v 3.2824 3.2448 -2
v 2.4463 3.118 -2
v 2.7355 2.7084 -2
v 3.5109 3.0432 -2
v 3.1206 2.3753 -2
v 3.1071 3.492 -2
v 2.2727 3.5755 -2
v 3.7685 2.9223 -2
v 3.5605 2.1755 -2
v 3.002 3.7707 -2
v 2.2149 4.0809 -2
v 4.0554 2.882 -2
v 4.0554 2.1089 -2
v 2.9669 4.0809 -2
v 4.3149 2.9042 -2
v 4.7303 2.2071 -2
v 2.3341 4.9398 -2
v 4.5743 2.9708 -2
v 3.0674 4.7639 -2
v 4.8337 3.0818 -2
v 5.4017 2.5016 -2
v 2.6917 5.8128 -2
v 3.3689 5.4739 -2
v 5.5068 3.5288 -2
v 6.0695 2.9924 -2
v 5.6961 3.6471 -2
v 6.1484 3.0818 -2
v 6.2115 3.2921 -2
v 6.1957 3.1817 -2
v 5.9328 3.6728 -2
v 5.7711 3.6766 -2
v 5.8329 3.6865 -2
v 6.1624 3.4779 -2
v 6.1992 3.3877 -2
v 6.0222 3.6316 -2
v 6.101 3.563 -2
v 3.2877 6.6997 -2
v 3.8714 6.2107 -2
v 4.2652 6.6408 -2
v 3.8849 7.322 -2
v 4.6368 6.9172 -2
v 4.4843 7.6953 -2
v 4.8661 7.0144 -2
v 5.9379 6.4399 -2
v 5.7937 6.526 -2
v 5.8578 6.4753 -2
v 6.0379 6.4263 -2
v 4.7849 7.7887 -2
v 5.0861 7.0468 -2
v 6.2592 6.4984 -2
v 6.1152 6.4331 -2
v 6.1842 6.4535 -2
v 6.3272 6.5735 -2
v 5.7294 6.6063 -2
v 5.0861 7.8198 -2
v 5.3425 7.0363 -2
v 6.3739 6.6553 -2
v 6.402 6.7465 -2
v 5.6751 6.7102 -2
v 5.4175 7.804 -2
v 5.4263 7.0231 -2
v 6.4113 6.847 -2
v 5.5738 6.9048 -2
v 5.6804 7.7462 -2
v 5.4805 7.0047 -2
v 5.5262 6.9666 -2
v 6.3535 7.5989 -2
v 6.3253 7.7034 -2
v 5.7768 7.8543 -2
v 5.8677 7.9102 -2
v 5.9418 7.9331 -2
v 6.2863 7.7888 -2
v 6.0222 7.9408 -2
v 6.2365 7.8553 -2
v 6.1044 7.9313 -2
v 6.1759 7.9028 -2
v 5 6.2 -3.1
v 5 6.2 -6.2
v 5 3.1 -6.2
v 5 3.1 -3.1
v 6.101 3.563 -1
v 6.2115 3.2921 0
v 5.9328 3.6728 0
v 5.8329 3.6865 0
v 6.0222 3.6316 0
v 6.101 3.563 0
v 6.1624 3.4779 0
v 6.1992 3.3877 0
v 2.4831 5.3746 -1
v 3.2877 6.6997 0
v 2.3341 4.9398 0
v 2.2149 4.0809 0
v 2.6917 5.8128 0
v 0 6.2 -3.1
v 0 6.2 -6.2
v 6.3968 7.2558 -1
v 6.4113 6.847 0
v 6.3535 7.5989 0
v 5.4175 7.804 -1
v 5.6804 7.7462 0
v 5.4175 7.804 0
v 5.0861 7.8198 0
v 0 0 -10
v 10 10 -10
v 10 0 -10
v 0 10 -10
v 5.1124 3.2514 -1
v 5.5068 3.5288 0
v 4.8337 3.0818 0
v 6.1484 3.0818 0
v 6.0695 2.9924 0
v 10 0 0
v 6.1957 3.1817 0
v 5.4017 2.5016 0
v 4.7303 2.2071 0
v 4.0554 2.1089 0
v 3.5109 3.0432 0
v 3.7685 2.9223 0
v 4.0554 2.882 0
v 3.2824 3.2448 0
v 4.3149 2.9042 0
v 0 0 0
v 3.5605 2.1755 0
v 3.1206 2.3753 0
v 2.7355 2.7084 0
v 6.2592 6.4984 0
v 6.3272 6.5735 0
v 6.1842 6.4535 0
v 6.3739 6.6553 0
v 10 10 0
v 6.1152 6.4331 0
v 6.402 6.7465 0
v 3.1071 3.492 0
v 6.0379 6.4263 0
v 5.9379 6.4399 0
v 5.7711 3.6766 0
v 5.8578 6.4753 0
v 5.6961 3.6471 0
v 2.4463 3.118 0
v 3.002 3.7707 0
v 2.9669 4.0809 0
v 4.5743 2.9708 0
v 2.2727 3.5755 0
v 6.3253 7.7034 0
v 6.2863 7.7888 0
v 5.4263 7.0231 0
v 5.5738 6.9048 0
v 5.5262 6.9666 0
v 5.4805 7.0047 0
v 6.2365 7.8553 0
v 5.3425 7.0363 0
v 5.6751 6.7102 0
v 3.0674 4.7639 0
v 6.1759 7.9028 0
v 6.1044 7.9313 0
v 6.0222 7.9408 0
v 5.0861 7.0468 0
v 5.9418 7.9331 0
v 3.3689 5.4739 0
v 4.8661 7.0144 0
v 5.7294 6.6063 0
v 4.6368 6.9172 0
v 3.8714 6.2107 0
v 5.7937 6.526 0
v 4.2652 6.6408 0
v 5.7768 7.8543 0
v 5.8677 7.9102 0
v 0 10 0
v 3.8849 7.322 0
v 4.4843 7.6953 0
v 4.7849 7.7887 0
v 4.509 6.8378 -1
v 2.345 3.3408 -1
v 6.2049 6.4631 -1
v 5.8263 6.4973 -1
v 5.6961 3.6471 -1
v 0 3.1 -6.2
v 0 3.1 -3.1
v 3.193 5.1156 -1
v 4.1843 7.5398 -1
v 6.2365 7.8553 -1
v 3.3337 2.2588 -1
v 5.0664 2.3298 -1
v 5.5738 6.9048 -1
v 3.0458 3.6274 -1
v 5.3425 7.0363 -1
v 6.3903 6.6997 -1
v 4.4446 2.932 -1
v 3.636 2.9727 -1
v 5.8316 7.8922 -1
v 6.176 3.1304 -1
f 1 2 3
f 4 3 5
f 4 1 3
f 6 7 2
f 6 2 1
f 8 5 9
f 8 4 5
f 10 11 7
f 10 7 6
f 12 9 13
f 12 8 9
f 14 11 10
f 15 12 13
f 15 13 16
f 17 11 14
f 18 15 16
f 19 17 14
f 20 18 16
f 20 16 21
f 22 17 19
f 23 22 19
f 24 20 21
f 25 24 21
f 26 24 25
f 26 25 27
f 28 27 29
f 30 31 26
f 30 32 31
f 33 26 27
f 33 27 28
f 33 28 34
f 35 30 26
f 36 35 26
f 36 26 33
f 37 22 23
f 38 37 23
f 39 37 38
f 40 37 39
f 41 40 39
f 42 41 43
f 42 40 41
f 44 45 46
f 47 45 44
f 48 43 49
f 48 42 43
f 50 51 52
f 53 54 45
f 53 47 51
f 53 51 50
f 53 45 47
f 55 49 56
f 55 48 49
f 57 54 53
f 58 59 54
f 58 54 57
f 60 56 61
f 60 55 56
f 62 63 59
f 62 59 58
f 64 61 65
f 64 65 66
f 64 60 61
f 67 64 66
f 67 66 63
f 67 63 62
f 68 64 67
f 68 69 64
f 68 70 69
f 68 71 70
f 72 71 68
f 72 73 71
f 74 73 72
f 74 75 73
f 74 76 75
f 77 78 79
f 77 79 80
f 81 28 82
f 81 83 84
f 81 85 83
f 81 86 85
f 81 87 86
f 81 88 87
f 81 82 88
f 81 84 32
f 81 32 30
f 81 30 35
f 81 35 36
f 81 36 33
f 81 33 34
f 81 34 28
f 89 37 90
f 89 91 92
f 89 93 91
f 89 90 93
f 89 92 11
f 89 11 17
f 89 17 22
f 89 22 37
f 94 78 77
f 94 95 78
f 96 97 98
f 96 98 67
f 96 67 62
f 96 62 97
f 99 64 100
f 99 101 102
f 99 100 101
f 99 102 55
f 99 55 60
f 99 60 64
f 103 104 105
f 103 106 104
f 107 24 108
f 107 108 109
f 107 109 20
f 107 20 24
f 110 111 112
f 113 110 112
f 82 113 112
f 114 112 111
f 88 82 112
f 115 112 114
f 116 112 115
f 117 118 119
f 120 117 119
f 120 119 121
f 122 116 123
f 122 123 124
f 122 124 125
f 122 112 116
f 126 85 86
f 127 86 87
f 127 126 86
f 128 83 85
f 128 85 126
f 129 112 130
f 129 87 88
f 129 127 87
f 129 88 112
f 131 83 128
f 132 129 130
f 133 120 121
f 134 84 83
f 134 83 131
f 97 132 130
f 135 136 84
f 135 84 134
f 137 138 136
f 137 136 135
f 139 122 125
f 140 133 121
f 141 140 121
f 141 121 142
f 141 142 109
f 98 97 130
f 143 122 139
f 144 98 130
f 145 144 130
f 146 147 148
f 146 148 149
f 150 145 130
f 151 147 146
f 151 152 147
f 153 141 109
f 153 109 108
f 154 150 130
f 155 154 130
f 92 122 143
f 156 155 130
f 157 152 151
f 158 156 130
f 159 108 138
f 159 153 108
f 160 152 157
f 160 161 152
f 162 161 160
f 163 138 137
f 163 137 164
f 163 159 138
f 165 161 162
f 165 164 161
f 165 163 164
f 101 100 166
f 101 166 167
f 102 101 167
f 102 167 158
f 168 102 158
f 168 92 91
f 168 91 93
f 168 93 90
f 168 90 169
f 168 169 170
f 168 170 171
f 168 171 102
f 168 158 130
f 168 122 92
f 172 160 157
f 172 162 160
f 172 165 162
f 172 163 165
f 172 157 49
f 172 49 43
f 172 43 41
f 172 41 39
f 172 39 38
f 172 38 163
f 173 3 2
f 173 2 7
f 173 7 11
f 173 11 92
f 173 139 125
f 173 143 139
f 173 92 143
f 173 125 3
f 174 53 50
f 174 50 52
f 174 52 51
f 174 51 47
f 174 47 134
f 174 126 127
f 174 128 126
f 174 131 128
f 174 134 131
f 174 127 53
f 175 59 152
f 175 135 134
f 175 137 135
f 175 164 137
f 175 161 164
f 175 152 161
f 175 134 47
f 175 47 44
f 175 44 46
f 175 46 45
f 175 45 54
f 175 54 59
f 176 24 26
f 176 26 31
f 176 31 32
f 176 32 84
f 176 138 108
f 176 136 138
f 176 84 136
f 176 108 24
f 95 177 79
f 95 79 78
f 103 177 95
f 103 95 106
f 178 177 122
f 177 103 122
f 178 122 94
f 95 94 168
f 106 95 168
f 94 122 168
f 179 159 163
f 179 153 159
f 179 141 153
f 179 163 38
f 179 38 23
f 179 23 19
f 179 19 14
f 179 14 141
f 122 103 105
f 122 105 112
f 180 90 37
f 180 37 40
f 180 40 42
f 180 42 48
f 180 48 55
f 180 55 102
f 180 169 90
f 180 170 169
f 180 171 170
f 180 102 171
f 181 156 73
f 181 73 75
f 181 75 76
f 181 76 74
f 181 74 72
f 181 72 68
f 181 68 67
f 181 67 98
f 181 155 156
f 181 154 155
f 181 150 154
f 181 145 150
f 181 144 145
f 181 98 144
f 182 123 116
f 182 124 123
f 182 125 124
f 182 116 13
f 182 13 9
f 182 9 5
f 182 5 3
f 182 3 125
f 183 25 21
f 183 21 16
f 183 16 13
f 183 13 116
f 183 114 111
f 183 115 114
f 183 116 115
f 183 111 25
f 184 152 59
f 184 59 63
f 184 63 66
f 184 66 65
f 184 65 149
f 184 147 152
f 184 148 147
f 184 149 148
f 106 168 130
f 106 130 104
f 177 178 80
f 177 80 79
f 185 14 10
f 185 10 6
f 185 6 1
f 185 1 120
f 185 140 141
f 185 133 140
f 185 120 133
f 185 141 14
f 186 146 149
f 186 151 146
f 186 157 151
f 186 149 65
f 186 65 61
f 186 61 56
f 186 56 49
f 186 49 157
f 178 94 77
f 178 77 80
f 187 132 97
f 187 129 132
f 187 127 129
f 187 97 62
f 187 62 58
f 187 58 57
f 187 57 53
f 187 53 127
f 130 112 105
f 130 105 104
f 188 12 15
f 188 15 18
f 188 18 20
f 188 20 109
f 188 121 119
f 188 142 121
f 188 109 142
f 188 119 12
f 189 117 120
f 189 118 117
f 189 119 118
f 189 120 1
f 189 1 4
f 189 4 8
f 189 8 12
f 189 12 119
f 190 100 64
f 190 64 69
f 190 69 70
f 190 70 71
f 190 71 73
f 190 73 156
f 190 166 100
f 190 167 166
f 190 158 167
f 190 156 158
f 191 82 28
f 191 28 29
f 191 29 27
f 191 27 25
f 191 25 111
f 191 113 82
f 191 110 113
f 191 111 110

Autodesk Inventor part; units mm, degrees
ref_plane "YZ Plane" through (0, 0, 0) normal (1, 0, 0) x (0, 1, 0)
ref_plane "XZ Plane" through (0, 0, 0) normal (0, 1, 0) x (-1, 0, 0)
ref_plane "XY Plane" through (0, 0, 0) normal (0, 0, 1) x (1, 0, 0)
sketch "Sketch1" plane through (0, 0, 0) normal (1, 0, 0) x (0, 1, 0)
  line L0 (0, 0) -> (10, 0)
  line L1 (10, 0) -> (10, -10)
  line L2 (10, -10) -> (0, -10)
  line L3 (0, -10) -> (0, 0)
  dimension "d0" = 10
  dimension "d1" = 10
extrude "Extrusion1" add sketch "Sketch1" along normal blind 10
sketch "Sketch4" plane through (0, 0, 0) normal (0, 0, 1) x (1, 0, 0)
  line L0 (1.8731, 7.9408) -> (4.4271, 7.9408) construction
  line L1 (4.4271, 7.9408) -> (4.4271, 4.8928) construction
  line L2 (4.4271, 4.8928) -> (1.8731, 4.8928) construction
  line L3 (1.8731, 4.8928) -> (1.8731, 7.9408) construction
  spline S0 degree 2 poles (6.0379, 6.4263) (5.7961, 6.4263) (5.6751, 6.7102) knots 0 0 0 1 1 1
  spline S1 degree 2 poles (5.6751, 6.7102) (5.5699, 6.9521) (5.4805, 7.0047) knots 0 0 0 1 1 1
  spline S2 degree 2 poles (5.4805, 7.0047) (5.4017, 7.0468) (5.0861, 7.0468) knots 0 0 0 1 1 1
  spline S3 degree 2 poles (5.0861, 7.0468) (4.5392, 7.0468) (3.8714, 6.2107) knots 0 0 0 1 1 1
  spline S4 degree 2 poles (3.8714, 6.2107) (2.9669, 5.0853) (2.9669, 4.0809) knots 0 0 0 1 1 1
  spline S5 degree 2 poles (2.9669, 4.0809) (2.9669, 3.5919) (3.2824, 3.2448) knots 0 0 0 1 1 1
  spline S6 degree 2 poles (3.2824, 3.2448) (3.6032, 2.882) (4.0554, 2.882) knots 0 0 0 1 1 1
  spline S7 degree 2 poles (4.0554, 2.882) (4.4446, 2.882) (4.8337, 3.0818) knots 0 0 0 1 1 1
  spline S8 degree 2 poles (4.8337, 3.0818) (5.0546, 3.1975) (5.5068, 3.5288) knots 0 0 0 1 1 1
  spline S9 degree 2 poles (5.5068, 3.5288) (5.7224, 3.6865) (5.8329, 3.6865) knots 0 0 0 1 1 1
  spline S10 degree 2 poles (5.8329, 3.6865) (5.9906, 3.6865) (6.2115, 3.4394) (6.2115, 3.2921) knots 0 0 0 1 2 2 2
  spline S11 degree 2 poles (6.2115, 3.2921) (6.2115, 3.1186) (6.0695, 2.9924) knots 0 0 0 1 1 1
  spline S12 degree 2 poles (6.0695, 2.9924) (5.0704, 2.1089) (4.0554, 2.1089) knots 0 0 0 1 1 1
  spline S13 degree 2 poles (4.0554, 2.1089) (3.2719, 2.1089) (2.7355, 2.7084) knots 0 0 0 1 1 1
  spline S14 degree 2 poles (2.7355, 2.7084) (2.2149, 3.2869) (2.2149, 4.0809) knots 0 0 0 1 1 1
  spline S15 degree 2 poles (2.2149, 4.0809) (2.2149, 5.3588) (3.2877, 6.6997) knots 0 0 0 1 1 1
  spline S16 degree 2 poles (3.2877, 6.6997) (4.1817, 7.8198) (5.0861, 7.8198) knots 0 0 0 1 1 1
  spline S17 degree 2 poles (5.0861, 7.8198) (5.2702, 7.8198) (5.5647, 7.7883) (5.6804, 7.7462) knots 0 0 0 1 2 2 2
  spline S18 degree 2 poles (5.6804, 7.7462) (5.8118, 7.9408) (6.0222, 7.9408) knots 0 0 0 1 1 1
  spline S19 degree 2 poles (6.0222, 7.9408) (6.2851, 7.9408) (6.3535, 7.5989) knots 0 0 0 1 1 1
  spline S20 degree 2 poles (6.3535, 7.5989) (6.4113, 7.2887) (6.4113, 6.847) knots 0 0 0 1 1 1
  spline S21 degree 2 poles (6.4113, 6.847) (6.4113, 6.6892) (6.3272, 6.5735) knots 0 0 0 1 1 1
  spline S22 degree 2 poles (6.3272, 6.5735) (6.2273, 6.4263) (6.0379, 6.4263) knots 0 0 0 1 1 1
  point P0 (0, 0)
extrude "Extrusion4" cut sketch "Sketch4" against normal blind 2
sketch "Sketch7" plane through (0, 0, 0) normal (-1, 0, 0) x (0, 0, 1)
  line L0 (-3.1, 3.1) -> (-6.2, 3.1)
  line L1 (-6.2, 3.1) -> (-6.2, 6.2)
  line L2 (-6.2, 6.2) -> (-3.1, 6.2)
  line L3 (-3.1, 6.2) -> (-3.1, 3.1)
  point P0 (0, 0)
  dimension "d16" = 3.1
  dimension "d17" = 3.1
extrude "Extrusion6" cut sketch "Sketch7" against normal blind 5
properties part number "Cytosine1"
